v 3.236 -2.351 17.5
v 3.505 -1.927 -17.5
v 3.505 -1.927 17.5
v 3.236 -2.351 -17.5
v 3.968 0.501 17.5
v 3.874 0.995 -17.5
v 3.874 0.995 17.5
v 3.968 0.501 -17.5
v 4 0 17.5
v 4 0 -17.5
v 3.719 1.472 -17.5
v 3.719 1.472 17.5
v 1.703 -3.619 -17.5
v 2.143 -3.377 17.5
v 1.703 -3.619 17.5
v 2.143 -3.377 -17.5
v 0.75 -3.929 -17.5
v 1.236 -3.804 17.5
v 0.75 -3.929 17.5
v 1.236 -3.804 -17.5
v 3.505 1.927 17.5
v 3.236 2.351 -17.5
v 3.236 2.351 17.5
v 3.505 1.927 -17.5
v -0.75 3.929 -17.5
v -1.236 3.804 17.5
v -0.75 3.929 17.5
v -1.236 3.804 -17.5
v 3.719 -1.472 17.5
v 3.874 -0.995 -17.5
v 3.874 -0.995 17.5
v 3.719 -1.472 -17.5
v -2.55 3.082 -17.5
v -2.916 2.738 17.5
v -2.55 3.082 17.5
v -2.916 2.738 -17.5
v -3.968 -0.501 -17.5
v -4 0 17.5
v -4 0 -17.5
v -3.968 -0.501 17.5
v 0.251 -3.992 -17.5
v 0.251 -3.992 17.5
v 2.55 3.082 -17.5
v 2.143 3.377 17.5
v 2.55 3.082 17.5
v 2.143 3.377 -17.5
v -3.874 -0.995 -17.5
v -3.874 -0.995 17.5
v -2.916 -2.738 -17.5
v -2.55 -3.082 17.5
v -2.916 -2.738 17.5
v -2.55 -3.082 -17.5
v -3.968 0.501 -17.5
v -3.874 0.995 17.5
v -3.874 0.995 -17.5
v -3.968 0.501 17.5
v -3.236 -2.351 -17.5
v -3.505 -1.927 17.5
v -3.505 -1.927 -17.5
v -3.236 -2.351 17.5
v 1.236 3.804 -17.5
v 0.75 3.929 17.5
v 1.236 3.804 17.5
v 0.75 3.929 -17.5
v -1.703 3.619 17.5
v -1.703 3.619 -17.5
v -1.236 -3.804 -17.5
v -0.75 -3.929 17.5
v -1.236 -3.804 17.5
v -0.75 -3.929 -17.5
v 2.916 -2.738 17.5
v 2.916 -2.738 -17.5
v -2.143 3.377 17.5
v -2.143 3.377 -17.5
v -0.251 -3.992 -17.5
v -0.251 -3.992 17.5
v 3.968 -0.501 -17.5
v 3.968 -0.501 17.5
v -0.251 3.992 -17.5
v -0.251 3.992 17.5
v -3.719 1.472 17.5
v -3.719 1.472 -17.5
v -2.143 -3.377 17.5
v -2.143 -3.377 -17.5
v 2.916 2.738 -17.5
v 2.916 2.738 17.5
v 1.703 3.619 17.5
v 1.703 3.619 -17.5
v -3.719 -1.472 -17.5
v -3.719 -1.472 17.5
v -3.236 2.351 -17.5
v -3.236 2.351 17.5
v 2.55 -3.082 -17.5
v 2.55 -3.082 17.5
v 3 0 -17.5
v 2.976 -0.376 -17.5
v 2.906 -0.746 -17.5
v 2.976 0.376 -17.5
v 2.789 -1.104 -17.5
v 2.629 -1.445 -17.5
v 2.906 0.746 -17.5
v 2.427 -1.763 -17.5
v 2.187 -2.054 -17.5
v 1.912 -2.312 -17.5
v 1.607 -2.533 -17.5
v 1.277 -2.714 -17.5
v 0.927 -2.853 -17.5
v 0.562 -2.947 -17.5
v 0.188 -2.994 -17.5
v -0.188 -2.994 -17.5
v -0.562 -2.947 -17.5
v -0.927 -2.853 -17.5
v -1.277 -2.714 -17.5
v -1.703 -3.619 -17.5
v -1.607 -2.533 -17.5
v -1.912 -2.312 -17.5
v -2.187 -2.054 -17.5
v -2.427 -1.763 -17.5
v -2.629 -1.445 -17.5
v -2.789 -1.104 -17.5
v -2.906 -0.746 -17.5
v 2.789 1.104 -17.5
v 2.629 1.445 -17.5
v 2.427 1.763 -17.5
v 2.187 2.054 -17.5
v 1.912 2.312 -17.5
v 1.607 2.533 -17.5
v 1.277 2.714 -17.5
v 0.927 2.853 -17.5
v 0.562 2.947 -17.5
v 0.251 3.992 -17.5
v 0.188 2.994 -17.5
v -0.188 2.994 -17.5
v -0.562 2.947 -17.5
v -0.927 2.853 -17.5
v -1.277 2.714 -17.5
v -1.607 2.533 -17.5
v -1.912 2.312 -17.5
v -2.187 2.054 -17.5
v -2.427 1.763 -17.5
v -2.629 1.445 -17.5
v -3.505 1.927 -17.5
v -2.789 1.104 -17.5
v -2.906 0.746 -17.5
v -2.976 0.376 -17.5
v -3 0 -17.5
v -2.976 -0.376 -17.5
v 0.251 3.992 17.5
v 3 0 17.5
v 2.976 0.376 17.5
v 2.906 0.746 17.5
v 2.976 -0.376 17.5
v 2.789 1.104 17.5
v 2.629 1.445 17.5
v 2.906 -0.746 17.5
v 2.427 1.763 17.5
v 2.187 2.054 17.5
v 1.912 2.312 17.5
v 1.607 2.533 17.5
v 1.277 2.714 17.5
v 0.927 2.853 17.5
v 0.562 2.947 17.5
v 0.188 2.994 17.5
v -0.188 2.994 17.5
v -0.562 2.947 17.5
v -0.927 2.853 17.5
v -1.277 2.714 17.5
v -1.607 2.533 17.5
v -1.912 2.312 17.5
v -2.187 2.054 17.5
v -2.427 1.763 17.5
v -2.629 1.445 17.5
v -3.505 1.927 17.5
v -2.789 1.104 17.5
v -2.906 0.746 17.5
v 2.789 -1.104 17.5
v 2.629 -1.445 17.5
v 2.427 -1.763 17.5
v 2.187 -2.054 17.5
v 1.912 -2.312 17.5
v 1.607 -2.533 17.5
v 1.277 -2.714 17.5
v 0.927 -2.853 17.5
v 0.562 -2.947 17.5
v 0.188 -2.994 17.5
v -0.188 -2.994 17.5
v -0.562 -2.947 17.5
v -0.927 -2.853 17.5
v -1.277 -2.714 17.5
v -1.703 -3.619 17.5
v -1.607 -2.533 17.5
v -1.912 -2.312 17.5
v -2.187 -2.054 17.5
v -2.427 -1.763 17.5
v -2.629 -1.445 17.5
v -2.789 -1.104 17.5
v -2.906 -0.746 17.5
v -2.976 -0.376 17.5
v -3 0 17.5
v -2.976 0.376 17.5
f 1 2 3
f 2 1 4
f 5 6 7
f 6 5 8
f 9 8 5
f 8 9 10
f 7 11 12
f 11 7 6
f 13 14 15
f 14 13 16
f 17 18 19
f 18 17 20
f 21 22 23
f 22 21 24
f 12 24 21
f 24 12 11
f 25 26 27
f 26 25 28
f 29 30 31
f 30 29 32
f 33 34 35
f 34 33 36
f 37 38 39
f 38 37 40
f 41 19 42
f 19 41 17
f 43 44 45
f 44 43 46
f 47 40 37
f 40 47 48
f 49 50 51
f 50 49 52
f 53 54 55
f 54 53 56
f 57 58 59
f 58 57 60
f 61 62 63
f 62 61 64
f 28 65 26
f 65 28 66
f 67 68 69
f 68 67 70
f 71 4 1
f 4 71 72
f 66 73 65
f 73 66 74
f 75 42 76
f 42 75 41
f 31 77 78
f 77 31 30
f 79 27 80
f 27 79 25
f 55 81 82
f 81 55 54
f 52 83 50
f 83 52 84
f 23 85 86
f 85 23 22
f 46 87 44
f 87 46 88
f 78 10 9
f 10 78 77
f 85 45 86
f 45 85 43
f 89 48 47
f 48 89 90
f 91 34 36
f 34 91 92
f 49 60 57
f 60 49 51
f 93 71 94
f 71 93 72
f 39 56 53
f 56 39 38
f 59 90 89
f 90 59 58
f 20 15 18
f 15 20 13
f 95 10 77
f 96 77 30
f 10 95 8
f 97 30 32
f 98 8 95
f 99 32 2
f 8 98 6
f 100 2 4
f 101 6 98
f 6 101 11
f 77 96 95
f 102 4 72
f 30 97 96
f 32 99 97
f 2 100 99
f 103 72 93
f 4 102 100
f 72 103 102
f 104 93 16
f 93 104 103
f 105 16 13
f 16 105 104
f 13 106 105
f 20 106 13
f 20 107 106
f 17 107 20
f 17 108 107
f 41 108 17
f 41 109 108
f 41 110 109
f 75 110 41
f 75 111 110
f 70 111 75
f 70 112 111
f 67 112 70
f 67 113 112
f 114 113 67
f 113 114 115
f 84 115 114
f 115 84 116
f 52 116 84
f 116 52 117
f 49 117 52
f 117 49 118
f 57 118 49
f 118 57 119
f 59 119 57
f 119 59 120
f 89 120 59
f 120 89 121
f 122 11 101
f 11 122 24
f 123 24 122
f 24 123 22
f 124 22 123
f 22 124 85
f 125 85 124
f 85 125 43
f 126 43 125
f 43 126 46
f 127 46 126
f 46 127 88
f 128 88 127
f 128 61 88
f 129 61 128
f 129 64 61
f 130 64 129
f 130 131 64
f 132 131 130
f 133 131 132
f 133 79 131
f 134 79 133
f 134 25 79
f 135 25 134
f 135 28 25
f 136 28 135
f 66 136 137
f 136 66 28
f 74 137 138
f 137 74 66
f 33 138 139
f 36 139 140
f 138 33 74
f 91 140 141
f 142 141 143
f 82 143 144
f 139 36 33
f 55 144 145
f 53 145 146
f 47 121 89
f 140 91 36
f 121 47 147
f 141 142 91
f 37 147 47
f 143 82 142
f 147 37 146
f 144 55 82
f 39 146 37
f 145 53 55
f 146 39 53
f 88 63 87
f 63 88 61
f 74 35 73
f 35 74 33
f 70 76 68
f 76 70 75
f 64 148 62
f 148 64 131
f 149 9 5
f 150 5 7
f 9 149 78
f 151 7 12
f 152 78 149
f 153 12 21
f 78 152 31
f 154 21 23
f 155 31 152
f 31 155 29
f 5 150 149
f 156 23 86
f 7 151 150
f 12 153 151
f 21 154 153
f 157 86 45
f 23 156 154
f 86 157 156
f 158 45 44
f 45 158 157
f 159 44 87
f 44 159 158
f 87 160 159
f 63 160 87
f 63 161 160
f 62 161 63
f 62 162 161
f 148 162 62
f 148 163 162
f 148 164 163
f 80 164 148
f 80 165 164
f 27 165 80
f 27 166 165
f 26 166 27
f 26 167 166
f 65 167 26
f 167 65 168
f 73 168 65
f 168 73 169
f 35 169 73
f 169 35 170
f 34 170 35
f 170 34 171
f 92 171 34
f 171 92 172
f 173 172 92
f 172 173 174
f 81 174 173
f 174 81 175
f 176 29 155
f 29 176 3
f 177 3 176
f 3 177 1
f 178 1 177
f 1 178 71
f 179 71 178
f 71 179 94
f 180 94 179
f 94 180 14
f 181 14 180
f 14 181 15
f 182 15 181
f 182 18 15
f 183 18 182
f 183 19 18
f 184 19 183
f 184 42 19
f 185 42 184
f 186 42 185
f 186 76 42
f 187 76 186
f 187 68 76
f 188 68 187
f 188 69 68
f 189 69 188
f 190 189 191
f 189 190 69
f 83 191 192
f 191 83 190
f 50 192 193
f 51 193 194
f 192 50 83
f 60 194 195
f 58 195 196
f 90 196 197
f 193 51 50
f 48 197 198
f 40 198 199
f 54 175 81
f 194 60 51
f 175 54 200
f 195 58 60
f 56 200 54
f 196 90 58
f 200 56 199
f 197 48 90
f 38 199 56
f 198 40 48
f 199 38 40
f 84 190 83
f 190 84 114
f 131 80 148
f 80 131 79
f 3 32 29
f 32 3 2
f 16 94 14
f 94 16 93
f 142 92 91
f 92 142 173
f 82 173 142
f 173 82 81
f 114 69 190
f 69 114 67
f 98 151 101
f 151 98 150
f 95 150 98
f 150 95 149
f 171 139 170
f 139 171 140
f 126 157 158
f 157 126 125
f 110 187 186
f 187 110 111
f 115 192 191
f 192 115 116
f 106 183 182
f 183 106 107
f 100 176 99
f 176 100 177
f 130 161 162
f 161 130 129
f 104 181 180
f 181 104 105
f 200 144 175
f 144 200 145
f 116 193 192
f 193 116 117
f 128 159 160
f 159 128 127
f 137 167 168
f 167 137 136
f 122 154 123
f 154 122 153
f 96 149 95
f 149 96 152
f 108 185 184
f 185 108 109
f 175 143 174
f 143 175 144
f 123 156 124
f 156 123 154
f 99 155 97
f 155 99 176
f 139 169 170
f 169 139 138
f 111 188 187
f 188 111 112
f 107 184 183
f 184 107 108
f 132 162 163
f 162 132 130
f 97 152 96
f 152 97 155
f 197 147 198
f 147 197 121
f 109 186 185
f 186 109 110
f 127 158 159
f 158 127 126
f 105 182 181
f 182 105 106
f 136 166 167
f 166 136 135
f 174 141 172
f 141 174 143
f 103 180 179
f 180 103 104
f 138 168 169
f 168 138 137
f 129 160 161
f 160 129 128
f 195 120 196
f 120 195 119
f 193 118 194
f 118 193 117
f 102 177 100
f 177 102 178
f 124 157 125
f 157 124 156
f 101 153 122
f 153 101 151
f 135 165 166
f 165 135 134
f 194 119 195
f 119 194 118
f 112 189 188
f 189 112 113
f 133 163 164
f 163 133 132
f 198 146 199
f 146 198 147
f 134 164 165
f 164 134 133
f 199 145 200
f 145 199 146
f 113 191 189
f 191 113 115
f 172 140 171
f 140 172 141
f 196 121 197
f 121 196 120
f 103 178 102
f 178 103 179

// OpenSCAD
$fn = 50;


difference() {
	union() {
		translate(v = [0, 0, -17.5000000000]) {
			cylinder(h = 35, r = 4.0000000000);
		}
	}
	union() {
		translate(v = [0, 0, -100.0000000000]) {
			cylinder(h = 200, r = 3.0000000000);
		}
	}
}
